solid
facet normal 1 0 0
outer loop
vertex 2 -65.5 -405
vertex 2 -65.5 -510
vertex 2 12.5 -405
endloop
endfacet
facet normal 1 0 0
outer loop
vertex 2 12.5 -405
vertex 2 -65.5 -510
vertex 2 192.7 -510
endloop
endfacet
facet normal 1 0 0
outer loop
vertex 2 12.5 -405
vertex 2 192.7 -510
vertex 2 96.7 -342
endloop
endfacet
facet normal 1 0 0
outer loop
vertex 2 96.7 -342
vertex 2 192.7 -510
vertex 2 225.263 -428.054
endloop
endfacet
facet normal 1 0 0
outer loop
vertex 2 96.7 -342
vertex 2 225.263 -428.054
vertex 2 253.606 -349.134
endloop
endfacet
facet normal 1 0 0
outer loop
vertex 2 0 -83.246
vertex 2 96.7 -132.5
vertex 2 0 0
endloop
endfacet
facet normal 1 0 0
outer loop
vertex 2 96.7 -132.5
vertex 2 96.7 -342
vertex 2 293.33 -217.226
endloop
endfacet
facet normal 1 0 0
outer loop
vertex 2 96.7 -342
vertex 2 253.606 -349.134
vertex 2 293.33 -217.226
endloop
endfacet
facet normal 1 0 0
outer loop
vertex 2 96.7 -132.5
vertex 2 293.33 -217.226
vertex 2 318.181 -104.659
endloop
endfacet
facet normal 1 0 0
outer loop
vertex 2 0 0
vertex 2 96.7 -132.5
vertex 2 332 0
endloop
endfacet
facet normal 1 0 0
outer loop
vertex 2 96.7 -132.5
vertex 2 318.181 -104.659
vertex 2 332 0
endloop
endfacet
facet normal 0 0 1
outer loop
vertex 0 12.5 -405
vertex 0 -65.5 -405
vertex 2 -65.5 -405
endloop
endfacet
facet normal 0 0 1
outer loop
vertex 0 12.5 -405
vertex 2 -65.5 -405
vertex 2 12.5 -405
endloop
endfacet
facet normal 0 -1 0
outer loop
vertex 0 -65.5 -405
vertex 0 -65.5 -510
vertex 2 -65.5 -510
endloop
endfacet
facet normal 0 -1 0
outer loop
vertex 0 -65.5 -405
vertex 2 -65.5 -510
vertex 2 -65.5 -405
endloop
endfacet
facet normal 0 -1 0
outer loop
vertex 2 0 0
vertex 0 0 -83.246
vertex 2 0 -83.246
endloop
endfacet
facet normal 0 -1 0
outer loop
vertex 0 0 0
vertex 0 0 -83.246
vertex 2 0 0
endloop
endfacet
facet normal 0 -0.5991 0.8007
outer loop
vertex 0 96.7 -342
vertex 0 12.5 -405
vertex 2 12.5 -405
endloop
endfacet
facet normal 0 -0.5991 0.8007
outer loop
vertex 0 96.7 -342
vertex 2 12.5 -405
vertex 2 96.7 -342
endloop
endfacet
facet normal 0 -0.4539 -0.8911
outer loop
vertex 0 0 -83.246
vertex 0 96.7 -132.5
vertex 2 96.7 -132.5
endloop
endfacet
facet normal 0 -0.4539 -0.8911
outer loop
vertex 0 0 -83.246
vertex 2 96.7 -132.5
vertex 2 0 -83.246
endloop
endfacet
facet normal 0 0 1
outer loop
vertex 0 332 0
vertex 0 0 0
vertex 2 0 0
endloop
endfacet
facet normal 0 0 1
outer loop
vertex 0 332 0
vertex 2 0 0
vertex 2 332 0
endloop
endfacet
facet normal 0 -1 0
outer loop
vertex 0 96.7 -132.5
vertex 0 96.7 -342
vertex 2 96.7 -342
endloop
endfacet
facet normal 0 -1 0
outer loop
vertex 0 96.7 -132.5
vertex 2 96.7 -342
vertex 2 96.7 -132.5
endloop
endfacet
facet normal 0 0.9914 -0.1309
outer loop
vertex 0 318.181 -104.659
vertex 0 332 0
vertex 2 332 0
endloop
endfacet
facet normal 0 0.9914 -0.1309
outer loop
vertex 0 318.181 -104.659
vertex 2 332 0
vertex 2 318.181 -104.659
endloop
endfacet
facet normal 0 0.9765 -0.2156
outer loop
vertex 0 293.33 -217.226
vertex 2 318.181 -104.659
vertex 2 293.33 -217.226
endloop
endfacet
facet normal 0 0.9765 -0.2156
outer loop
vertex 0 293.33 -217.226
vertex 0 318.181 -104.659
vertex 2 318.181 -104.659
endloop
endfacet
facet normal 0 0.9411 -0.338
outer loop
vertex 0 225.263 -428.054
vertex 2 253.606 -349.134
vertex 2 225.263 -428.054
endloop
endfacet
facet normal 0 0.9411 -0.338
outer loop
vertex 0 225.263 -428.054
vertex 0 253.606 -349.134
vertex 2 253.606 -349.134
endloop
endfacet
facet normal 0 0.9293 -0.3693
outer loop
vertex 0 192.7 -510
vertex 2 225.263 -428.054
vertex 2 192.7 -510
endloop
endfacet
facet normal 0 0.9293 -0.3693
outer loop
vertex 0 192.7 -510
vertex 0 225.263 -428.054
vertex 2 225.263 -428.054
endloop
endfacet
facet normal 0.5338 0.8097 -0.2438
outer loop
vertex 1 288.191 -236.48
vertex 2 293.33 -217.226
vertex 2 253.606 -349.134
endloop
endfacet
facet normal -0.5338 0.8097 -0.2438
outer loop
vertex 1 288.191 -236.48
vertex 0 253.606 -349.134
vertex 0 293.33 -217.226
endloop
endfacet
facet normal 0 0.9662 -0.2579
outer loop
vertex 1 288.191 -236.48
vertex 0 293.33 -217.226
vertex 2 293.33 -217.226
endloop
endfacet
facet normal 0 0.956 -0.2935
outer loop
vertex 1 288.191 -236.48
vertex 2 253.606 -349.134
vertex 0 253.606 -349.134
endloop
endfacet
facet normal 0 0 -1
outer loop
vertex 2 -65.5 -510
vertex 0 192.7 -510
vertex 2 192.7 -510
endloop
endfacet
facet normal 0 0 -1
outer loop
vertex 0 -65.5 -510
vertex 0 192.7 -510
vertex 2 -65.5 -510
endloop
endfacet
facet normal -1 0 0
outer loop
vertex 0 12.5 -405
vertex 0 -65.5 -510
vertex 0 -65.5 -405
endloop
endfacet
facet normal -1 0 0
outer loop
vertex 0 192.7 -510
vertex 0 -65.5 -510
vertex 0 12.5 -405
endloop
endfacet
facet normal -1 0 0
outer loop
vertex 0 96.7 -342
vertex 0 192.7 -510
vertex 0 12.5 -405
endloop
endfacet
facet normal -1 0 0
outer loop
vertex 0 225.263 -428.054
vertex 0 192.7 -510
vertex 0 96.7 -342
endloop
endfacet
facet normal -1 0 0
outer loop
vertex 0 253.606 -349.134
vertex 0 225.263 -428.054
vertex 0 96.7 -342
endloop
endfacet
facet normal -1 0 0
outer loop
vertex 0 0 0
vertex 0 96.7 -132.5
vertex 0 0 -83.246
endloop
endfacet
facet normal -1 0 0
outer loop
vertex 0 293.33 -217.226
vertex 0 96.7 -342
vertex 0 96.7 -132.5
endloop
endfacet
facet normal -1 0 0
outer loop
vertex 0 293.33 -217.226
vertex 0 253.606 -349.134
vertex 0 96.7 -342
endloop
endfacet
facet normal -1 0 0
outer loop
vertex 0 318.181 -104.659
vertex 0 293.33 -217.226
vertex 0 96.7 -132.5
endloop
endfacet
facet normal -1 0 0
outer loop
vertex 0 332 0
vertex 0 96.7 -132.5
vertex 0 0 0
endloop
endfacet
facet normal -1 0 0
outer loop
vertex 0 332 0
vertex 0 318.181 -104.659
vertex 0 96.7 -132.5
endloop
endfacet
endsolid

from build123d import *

# Parameters (mm, degrees)
BOSS_EXTRUDE1_DEPTH = 2


with BuildPart() as part:
    # Sketch1 → Boss-Extrude1 (new body)
    with BuildSketch(Plane(origin=(0, 0, 0), x_dir=(0, 0, -1), z_dir=(1, 0, 0))):
        with BuildLine():
            Line((0, 0), (0, 332))
            add(Edge.make_bspline(
                [(0, 332), (217.959962459, 314.031089263), (510, 192.7)],
                knots=[0, 0, 0, 1, 1, 1], degree=2))
            Line((510, 192.7), (510, 0))
            Line((510, 0), (510, -65.5))
            Line((510, -65.5), (405, -65.5))
            Line((405, -65.5), (405, 12.5))
            Line((405, 12.5), (342, 96.7))
            Line((342, 96.7), (132.5, 96.7))
            Line((132.5, 96.7), (83.246188613, 0))
            Line((83.246188613, 0), (0, 0))
        make_face()
    extrude(amount=BOSS_EXTRUDE1_DEPTH)


solid = part.part
